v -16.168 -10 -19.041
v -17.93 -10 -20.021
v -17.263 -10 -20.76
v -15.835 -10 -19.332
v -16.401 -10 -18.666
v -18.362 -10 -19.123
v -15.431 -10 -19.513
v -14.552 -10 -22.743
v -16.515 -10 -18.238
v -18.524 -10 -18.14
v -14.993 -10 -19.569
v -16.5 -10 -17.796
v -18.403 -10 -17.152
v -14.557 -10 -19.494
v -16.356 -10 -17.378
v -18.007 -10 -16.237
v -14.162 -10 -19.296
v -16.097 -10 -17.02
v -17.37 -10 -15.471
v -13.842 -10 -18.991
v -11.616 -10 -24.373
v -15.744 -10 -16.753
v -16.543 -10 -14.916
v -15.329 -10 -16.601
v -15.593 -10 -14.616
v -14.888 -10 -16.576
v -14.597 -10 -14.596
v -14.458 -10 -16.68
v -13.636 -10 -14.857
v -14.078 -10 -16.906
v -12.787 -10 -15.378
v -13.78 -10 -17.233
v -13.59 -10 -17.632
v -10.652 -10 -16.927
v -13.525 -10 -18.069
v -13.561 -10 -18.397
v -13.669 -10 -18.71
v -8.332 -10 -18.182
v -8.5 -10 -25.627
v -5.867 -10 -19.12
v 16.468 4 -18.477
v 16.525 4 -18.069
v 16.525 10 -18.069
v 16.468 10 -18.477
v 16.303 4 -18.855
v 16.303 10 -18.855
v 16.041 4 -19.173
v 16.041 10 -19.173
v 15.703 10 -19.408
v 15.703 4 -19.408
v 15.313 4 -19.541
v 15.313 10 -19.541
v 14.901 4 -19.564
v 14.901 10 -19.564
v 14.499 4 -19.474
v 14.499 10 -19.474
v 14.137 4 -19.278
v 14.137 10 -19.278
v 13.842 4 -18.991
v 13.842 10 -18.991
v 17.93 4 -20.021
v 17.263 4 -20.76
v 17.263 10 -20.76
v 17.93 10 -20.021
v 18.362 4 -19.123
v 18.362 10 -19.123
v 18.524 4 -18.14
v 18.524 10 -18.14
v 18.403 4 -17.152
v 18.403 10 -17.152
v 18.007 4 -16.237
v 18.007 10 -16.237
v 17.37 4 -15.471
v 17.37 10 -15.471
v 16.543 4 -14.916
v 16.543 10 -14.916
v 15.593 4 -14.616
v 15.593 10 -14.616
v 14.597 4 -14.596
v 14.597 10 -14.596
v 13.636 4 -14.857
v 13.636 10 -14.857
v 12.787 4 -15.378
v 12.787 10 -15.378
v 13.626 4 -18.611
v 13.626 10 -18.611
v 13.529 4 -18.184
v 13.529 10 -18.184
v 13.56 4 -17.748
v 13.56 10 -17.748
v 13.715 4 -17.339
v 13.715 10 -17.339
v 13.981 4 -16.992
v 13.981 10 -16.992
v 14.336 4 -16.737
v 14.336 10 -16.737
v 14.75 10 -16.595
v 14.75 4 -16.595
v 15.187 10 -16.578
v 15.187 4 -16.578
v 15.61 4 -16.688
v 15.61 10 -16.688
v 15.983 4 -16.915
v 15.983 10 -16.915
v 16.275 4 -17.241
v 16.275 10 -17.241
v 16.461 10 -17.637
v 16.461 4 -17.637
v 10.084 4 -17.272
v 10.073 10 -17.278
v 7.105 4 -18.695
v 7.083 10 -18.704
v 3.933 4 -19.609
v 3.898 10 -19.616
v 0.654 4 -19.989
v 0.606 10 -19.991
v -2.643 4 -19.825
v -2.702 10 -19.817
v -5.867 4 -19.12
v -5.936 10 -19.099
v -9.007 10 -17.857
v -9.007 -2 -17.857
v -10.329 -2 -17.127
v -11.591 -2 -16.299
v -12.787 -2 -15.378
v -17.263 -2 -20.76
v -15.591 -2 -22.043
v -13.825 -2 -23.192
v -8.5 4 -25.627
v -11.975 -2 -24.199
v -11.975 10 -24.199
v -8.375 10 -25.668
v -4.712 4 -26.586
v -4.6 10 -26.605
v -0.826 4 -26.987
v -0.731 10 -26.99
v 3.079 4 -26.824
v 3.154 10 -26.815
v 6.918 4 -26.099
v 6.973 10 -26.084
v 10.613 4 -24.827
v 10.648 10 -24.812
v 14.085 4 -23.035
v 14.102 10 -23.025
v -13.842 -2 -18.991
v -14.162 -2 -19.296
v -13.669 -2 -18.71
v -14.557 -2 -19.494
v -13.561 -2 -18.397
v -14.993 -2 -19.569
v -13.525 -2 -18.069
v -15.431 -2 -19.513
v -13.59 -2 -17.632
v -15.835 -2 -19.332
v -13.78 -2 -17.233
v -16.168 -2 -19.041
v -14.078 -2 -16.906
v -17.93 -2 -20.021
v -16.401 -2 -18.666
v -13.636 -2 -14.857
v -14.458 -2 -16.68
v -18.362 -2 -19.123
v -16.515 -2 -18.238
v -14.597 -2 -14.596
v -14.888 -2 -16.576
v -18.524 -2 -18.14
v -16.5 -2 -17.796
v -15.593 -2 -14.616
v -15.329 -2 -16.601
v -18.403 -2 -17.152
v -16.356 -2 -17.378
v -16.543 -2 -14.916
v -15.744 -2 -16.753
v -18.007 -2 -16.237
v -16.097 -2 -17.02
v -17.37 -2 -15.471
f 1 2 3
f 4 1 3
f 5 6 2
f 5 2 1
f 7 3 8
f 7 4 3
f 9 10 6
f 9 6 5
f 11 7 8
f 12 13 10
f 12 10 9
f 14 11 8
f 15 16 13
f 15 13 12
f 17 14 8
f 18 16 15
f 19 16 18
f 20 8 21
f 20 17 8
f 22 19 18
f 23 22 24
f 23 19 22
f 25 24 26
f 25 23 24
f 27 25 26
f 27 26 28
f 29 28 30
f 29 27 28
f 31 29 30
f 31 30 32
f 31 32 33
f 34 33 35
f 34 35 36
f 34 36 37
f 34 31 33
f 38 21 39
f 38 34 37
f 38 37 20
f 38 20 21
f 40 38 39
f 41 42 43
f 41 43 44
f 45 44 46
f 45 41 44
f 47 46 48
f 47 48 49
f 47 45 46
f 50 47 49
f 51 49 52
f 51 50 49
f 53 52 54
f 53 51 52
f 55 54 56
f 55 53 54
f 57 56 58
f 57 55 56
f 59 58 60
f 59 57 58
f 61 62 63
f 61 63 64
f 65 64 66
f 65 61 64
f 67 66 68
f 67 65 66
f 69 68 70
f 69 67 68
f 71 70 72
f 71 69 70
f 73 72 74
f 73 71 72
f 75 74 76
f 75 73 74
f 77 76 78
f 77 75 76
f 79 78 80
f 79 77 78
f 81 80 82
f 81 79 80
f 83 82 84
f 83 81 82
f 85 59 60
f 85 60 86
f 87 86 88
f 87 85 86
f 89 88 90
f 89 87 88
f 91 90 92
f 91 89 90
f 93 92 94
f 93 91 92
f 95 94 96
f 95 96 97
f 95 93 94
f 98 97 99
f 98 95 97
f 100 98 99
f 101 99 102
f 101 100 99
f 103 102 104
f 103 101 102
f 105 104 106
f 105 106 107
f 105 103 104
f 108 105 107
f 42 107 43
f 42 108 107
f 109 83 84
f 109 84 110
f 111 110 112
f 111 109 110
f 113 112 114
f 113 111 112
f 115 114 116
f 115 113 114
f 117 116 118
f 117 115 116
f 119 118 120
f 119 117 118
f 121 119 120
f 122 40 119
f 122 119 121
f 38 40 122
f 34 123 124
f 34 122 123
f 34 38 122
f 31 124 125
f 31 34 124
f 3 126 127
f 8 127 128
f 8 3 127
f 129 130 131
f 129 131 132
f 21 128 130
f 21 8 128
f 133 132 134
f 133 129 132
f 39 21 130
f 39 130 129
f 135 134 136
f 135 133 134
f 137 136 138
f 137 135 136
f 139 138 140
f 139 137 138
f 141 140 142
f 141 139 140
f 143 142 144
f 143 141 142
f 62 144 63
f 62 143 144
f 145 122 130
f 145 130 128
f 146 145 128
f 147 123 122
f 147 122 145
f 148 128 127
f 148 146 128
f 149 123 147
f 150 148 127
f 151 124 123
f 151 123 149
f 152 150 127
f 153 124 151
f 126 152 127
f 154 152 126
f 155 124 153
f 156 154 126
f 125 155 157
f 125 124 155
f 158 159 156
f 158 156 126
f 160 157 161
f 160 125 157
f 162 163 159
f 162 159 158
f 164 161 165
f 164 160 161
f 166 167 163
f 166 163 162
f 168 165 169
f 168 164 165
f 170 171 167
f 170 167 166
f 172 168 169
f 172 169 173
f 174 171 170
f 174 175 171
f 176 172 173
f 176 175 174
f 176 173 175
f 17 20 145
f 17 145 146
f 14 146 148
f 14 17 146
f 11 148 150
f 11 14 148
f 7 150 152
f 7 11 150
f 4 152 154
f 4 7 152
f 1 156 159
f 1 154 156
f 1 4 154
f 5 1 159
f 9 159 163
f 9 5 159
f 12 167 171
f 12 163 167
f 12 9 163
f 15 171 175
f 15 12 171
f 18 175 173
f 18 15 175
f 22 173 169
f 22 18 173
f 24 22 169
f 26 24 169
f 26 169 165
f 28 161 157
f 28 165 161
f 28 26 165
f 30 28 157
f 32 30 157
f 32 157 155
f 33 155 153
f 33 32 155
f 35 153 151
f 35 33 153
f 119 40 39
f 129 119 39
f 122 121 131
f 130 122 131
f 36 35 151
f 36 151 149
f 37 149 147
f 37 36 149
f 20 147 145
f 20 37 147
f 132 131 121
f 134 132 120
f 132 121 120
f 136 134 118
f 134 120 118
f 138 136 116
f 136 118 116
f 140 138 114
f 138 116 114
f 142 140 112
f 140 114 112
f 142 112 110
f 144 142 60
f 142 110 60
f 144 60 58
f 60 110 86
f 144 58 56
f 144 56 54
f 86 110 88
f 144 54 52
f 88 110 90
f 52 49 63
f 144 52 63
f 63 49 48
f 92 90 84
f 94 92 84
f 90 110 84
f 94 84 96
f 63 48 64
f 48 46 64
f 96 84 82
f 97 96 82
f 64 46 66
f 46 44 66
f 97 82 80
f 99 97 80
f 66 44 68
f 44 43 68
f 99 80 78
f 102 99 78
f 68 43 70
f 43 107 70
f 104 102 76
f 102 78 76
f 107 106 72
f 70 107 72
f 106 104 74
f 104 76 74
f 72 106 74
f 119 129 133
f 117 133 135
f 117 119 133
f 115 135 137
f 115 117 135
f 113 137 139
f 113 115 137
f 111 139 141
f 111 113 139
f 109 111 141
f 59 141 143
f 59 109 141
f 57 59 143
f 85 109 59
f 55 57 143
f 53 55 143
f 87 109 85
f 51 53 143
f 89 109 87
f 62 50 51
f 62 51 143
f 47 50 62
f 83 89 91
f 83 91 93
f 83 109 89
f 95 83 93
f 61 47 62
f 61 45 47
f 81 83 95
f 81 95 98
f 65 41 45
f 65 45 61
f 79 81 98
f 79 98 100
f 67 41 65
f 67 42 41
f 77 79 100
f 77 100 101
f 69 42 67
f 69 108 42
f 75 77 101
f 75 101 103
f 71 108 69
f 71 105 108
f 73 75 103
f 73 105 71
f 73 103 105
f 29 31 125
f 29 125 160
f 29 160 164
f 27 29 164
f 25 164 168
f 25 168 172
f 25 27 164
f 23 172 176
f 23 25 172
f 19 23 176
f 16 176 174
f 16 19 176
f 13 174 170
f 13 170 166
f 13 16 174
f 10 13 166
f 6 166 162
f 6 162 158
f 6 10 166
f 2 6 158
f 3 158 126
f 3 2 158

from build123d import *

# Parameters (mm, degrees)
F1_DEPTH = 10
F3_DEPTH = 14
F5_DEPTH = 12


with BuildPart() as f1:
    # F0 (on Front) → F1 (new body, symmetric)
    with BuildSketch(Plane.XZ):
        with BuildLine():
            ThreePointArc((12.787234, -15.378122), (0, -20), (-12.787234, -15.378122))
            ThreePointArc((-12.787234, -15.378122), (-17.716171, -15.831528), (-17.262766, -20.760465))
            ThreePointArc((-17.262766, -20.760465), (0, -27), (17.262766, -20.760465))
            ThreePointArc((17.262766, -20.760465), (17.716171, -15.831528), (12.787234, -15.378122))
        make_face()
        with BuildLine():
            ThreePointArc((-13.525, -18.069294), (-13.606362, -18.556598), (-13.841621, -18.991038))
            ThreePointArc((-13.841621, -18.991038), (-16.443638, -17.581989), (-13.525, -18.069294))
        make_face(mode=Mode.SUBTRACT)
        with BuildLine():
            ThreePointArc((16.525, -18.069294), (15.512304, -19.487932), (13.841621, -18.991038))
            ThreePointArc((13.841621, -18.991038), (14.537696, -16.650655), (16.525, -18.069294))
        make_face(mode=Mode.SUBTRACT)
    extrude(amount=F1_DEPTH, both=True)

    # F2 (on face) → F3 (cut)
    with BuildSketch(Plane.XZ.offset(10)):
        with BuildLine():
            Line((31.764954, -10.083012), (-3.385311, -12.986047))
            Line((-3.385311, -12.986047), (-5.867412, -19.119976))
            ThreePointArc((-5.867412, -19.119976), (3.933364, -19.609402), (12.787234, -15.378122))
            ThreePointArc((12.787234, -15.378122), (17.716171, -15.831528), (17.262766, -20.760465))
            ThreePointArc((17.262766, -20.760465), (5.011502, -26.530828), (-8.500477, -25.626976))
            Line((-8.500477, -25.626976), (-10.211368, -29.855039))
            Line((-10.211368, -29.855039), (28.234236, -31.502709))
            Line((28.234236, -31.502709), (31.764954, -10.083012))
        make_face()
        with BuildLine():
            ThreePointArc((12.787234, -15.378122), (3.933364, -19.609402), (-5.867412, -19.119976))
            Line((-5.867412, -19.119976), (-8.500477, -25.626976))
            ThreePointArc((-8.500477, -25.626976), (5.011502, -26.530828), (17.262766, -20.760465))
            ThreePointArc((17.262766, -20.760465), (17.716171, -15.831528), (12.787234, -15.378122))
        make_face()
        with BuildLine():
            ThreePointArc((13.841621, -18.991038), (14.537696, -16.650655), (16.525, -18.069294))
            ThreePointArc((16.525, -18.069294), (15.512304, -19.487932), (13.841621, -18.991038))
        make_face(mode=Mode.SUBTRACT)
    extrude(amount=-F3_DEPTH, mode=Mode.SUBTRACT)

    # F4 (on face) → F5 (cut)
    with BuildSketch(Plane(origin=(0, 10, 0), x_dir=(-1, 0, 0), z_dir=(0, 1, 0))):
        Polygon((7.364115, -14.344795), (13.547452, -27.560162), (28.157102, -12.950514), align=None)
    extrude(amount=-F5_DEPTH, mode=Mode.SUBTRACT)


solid = f1.part
